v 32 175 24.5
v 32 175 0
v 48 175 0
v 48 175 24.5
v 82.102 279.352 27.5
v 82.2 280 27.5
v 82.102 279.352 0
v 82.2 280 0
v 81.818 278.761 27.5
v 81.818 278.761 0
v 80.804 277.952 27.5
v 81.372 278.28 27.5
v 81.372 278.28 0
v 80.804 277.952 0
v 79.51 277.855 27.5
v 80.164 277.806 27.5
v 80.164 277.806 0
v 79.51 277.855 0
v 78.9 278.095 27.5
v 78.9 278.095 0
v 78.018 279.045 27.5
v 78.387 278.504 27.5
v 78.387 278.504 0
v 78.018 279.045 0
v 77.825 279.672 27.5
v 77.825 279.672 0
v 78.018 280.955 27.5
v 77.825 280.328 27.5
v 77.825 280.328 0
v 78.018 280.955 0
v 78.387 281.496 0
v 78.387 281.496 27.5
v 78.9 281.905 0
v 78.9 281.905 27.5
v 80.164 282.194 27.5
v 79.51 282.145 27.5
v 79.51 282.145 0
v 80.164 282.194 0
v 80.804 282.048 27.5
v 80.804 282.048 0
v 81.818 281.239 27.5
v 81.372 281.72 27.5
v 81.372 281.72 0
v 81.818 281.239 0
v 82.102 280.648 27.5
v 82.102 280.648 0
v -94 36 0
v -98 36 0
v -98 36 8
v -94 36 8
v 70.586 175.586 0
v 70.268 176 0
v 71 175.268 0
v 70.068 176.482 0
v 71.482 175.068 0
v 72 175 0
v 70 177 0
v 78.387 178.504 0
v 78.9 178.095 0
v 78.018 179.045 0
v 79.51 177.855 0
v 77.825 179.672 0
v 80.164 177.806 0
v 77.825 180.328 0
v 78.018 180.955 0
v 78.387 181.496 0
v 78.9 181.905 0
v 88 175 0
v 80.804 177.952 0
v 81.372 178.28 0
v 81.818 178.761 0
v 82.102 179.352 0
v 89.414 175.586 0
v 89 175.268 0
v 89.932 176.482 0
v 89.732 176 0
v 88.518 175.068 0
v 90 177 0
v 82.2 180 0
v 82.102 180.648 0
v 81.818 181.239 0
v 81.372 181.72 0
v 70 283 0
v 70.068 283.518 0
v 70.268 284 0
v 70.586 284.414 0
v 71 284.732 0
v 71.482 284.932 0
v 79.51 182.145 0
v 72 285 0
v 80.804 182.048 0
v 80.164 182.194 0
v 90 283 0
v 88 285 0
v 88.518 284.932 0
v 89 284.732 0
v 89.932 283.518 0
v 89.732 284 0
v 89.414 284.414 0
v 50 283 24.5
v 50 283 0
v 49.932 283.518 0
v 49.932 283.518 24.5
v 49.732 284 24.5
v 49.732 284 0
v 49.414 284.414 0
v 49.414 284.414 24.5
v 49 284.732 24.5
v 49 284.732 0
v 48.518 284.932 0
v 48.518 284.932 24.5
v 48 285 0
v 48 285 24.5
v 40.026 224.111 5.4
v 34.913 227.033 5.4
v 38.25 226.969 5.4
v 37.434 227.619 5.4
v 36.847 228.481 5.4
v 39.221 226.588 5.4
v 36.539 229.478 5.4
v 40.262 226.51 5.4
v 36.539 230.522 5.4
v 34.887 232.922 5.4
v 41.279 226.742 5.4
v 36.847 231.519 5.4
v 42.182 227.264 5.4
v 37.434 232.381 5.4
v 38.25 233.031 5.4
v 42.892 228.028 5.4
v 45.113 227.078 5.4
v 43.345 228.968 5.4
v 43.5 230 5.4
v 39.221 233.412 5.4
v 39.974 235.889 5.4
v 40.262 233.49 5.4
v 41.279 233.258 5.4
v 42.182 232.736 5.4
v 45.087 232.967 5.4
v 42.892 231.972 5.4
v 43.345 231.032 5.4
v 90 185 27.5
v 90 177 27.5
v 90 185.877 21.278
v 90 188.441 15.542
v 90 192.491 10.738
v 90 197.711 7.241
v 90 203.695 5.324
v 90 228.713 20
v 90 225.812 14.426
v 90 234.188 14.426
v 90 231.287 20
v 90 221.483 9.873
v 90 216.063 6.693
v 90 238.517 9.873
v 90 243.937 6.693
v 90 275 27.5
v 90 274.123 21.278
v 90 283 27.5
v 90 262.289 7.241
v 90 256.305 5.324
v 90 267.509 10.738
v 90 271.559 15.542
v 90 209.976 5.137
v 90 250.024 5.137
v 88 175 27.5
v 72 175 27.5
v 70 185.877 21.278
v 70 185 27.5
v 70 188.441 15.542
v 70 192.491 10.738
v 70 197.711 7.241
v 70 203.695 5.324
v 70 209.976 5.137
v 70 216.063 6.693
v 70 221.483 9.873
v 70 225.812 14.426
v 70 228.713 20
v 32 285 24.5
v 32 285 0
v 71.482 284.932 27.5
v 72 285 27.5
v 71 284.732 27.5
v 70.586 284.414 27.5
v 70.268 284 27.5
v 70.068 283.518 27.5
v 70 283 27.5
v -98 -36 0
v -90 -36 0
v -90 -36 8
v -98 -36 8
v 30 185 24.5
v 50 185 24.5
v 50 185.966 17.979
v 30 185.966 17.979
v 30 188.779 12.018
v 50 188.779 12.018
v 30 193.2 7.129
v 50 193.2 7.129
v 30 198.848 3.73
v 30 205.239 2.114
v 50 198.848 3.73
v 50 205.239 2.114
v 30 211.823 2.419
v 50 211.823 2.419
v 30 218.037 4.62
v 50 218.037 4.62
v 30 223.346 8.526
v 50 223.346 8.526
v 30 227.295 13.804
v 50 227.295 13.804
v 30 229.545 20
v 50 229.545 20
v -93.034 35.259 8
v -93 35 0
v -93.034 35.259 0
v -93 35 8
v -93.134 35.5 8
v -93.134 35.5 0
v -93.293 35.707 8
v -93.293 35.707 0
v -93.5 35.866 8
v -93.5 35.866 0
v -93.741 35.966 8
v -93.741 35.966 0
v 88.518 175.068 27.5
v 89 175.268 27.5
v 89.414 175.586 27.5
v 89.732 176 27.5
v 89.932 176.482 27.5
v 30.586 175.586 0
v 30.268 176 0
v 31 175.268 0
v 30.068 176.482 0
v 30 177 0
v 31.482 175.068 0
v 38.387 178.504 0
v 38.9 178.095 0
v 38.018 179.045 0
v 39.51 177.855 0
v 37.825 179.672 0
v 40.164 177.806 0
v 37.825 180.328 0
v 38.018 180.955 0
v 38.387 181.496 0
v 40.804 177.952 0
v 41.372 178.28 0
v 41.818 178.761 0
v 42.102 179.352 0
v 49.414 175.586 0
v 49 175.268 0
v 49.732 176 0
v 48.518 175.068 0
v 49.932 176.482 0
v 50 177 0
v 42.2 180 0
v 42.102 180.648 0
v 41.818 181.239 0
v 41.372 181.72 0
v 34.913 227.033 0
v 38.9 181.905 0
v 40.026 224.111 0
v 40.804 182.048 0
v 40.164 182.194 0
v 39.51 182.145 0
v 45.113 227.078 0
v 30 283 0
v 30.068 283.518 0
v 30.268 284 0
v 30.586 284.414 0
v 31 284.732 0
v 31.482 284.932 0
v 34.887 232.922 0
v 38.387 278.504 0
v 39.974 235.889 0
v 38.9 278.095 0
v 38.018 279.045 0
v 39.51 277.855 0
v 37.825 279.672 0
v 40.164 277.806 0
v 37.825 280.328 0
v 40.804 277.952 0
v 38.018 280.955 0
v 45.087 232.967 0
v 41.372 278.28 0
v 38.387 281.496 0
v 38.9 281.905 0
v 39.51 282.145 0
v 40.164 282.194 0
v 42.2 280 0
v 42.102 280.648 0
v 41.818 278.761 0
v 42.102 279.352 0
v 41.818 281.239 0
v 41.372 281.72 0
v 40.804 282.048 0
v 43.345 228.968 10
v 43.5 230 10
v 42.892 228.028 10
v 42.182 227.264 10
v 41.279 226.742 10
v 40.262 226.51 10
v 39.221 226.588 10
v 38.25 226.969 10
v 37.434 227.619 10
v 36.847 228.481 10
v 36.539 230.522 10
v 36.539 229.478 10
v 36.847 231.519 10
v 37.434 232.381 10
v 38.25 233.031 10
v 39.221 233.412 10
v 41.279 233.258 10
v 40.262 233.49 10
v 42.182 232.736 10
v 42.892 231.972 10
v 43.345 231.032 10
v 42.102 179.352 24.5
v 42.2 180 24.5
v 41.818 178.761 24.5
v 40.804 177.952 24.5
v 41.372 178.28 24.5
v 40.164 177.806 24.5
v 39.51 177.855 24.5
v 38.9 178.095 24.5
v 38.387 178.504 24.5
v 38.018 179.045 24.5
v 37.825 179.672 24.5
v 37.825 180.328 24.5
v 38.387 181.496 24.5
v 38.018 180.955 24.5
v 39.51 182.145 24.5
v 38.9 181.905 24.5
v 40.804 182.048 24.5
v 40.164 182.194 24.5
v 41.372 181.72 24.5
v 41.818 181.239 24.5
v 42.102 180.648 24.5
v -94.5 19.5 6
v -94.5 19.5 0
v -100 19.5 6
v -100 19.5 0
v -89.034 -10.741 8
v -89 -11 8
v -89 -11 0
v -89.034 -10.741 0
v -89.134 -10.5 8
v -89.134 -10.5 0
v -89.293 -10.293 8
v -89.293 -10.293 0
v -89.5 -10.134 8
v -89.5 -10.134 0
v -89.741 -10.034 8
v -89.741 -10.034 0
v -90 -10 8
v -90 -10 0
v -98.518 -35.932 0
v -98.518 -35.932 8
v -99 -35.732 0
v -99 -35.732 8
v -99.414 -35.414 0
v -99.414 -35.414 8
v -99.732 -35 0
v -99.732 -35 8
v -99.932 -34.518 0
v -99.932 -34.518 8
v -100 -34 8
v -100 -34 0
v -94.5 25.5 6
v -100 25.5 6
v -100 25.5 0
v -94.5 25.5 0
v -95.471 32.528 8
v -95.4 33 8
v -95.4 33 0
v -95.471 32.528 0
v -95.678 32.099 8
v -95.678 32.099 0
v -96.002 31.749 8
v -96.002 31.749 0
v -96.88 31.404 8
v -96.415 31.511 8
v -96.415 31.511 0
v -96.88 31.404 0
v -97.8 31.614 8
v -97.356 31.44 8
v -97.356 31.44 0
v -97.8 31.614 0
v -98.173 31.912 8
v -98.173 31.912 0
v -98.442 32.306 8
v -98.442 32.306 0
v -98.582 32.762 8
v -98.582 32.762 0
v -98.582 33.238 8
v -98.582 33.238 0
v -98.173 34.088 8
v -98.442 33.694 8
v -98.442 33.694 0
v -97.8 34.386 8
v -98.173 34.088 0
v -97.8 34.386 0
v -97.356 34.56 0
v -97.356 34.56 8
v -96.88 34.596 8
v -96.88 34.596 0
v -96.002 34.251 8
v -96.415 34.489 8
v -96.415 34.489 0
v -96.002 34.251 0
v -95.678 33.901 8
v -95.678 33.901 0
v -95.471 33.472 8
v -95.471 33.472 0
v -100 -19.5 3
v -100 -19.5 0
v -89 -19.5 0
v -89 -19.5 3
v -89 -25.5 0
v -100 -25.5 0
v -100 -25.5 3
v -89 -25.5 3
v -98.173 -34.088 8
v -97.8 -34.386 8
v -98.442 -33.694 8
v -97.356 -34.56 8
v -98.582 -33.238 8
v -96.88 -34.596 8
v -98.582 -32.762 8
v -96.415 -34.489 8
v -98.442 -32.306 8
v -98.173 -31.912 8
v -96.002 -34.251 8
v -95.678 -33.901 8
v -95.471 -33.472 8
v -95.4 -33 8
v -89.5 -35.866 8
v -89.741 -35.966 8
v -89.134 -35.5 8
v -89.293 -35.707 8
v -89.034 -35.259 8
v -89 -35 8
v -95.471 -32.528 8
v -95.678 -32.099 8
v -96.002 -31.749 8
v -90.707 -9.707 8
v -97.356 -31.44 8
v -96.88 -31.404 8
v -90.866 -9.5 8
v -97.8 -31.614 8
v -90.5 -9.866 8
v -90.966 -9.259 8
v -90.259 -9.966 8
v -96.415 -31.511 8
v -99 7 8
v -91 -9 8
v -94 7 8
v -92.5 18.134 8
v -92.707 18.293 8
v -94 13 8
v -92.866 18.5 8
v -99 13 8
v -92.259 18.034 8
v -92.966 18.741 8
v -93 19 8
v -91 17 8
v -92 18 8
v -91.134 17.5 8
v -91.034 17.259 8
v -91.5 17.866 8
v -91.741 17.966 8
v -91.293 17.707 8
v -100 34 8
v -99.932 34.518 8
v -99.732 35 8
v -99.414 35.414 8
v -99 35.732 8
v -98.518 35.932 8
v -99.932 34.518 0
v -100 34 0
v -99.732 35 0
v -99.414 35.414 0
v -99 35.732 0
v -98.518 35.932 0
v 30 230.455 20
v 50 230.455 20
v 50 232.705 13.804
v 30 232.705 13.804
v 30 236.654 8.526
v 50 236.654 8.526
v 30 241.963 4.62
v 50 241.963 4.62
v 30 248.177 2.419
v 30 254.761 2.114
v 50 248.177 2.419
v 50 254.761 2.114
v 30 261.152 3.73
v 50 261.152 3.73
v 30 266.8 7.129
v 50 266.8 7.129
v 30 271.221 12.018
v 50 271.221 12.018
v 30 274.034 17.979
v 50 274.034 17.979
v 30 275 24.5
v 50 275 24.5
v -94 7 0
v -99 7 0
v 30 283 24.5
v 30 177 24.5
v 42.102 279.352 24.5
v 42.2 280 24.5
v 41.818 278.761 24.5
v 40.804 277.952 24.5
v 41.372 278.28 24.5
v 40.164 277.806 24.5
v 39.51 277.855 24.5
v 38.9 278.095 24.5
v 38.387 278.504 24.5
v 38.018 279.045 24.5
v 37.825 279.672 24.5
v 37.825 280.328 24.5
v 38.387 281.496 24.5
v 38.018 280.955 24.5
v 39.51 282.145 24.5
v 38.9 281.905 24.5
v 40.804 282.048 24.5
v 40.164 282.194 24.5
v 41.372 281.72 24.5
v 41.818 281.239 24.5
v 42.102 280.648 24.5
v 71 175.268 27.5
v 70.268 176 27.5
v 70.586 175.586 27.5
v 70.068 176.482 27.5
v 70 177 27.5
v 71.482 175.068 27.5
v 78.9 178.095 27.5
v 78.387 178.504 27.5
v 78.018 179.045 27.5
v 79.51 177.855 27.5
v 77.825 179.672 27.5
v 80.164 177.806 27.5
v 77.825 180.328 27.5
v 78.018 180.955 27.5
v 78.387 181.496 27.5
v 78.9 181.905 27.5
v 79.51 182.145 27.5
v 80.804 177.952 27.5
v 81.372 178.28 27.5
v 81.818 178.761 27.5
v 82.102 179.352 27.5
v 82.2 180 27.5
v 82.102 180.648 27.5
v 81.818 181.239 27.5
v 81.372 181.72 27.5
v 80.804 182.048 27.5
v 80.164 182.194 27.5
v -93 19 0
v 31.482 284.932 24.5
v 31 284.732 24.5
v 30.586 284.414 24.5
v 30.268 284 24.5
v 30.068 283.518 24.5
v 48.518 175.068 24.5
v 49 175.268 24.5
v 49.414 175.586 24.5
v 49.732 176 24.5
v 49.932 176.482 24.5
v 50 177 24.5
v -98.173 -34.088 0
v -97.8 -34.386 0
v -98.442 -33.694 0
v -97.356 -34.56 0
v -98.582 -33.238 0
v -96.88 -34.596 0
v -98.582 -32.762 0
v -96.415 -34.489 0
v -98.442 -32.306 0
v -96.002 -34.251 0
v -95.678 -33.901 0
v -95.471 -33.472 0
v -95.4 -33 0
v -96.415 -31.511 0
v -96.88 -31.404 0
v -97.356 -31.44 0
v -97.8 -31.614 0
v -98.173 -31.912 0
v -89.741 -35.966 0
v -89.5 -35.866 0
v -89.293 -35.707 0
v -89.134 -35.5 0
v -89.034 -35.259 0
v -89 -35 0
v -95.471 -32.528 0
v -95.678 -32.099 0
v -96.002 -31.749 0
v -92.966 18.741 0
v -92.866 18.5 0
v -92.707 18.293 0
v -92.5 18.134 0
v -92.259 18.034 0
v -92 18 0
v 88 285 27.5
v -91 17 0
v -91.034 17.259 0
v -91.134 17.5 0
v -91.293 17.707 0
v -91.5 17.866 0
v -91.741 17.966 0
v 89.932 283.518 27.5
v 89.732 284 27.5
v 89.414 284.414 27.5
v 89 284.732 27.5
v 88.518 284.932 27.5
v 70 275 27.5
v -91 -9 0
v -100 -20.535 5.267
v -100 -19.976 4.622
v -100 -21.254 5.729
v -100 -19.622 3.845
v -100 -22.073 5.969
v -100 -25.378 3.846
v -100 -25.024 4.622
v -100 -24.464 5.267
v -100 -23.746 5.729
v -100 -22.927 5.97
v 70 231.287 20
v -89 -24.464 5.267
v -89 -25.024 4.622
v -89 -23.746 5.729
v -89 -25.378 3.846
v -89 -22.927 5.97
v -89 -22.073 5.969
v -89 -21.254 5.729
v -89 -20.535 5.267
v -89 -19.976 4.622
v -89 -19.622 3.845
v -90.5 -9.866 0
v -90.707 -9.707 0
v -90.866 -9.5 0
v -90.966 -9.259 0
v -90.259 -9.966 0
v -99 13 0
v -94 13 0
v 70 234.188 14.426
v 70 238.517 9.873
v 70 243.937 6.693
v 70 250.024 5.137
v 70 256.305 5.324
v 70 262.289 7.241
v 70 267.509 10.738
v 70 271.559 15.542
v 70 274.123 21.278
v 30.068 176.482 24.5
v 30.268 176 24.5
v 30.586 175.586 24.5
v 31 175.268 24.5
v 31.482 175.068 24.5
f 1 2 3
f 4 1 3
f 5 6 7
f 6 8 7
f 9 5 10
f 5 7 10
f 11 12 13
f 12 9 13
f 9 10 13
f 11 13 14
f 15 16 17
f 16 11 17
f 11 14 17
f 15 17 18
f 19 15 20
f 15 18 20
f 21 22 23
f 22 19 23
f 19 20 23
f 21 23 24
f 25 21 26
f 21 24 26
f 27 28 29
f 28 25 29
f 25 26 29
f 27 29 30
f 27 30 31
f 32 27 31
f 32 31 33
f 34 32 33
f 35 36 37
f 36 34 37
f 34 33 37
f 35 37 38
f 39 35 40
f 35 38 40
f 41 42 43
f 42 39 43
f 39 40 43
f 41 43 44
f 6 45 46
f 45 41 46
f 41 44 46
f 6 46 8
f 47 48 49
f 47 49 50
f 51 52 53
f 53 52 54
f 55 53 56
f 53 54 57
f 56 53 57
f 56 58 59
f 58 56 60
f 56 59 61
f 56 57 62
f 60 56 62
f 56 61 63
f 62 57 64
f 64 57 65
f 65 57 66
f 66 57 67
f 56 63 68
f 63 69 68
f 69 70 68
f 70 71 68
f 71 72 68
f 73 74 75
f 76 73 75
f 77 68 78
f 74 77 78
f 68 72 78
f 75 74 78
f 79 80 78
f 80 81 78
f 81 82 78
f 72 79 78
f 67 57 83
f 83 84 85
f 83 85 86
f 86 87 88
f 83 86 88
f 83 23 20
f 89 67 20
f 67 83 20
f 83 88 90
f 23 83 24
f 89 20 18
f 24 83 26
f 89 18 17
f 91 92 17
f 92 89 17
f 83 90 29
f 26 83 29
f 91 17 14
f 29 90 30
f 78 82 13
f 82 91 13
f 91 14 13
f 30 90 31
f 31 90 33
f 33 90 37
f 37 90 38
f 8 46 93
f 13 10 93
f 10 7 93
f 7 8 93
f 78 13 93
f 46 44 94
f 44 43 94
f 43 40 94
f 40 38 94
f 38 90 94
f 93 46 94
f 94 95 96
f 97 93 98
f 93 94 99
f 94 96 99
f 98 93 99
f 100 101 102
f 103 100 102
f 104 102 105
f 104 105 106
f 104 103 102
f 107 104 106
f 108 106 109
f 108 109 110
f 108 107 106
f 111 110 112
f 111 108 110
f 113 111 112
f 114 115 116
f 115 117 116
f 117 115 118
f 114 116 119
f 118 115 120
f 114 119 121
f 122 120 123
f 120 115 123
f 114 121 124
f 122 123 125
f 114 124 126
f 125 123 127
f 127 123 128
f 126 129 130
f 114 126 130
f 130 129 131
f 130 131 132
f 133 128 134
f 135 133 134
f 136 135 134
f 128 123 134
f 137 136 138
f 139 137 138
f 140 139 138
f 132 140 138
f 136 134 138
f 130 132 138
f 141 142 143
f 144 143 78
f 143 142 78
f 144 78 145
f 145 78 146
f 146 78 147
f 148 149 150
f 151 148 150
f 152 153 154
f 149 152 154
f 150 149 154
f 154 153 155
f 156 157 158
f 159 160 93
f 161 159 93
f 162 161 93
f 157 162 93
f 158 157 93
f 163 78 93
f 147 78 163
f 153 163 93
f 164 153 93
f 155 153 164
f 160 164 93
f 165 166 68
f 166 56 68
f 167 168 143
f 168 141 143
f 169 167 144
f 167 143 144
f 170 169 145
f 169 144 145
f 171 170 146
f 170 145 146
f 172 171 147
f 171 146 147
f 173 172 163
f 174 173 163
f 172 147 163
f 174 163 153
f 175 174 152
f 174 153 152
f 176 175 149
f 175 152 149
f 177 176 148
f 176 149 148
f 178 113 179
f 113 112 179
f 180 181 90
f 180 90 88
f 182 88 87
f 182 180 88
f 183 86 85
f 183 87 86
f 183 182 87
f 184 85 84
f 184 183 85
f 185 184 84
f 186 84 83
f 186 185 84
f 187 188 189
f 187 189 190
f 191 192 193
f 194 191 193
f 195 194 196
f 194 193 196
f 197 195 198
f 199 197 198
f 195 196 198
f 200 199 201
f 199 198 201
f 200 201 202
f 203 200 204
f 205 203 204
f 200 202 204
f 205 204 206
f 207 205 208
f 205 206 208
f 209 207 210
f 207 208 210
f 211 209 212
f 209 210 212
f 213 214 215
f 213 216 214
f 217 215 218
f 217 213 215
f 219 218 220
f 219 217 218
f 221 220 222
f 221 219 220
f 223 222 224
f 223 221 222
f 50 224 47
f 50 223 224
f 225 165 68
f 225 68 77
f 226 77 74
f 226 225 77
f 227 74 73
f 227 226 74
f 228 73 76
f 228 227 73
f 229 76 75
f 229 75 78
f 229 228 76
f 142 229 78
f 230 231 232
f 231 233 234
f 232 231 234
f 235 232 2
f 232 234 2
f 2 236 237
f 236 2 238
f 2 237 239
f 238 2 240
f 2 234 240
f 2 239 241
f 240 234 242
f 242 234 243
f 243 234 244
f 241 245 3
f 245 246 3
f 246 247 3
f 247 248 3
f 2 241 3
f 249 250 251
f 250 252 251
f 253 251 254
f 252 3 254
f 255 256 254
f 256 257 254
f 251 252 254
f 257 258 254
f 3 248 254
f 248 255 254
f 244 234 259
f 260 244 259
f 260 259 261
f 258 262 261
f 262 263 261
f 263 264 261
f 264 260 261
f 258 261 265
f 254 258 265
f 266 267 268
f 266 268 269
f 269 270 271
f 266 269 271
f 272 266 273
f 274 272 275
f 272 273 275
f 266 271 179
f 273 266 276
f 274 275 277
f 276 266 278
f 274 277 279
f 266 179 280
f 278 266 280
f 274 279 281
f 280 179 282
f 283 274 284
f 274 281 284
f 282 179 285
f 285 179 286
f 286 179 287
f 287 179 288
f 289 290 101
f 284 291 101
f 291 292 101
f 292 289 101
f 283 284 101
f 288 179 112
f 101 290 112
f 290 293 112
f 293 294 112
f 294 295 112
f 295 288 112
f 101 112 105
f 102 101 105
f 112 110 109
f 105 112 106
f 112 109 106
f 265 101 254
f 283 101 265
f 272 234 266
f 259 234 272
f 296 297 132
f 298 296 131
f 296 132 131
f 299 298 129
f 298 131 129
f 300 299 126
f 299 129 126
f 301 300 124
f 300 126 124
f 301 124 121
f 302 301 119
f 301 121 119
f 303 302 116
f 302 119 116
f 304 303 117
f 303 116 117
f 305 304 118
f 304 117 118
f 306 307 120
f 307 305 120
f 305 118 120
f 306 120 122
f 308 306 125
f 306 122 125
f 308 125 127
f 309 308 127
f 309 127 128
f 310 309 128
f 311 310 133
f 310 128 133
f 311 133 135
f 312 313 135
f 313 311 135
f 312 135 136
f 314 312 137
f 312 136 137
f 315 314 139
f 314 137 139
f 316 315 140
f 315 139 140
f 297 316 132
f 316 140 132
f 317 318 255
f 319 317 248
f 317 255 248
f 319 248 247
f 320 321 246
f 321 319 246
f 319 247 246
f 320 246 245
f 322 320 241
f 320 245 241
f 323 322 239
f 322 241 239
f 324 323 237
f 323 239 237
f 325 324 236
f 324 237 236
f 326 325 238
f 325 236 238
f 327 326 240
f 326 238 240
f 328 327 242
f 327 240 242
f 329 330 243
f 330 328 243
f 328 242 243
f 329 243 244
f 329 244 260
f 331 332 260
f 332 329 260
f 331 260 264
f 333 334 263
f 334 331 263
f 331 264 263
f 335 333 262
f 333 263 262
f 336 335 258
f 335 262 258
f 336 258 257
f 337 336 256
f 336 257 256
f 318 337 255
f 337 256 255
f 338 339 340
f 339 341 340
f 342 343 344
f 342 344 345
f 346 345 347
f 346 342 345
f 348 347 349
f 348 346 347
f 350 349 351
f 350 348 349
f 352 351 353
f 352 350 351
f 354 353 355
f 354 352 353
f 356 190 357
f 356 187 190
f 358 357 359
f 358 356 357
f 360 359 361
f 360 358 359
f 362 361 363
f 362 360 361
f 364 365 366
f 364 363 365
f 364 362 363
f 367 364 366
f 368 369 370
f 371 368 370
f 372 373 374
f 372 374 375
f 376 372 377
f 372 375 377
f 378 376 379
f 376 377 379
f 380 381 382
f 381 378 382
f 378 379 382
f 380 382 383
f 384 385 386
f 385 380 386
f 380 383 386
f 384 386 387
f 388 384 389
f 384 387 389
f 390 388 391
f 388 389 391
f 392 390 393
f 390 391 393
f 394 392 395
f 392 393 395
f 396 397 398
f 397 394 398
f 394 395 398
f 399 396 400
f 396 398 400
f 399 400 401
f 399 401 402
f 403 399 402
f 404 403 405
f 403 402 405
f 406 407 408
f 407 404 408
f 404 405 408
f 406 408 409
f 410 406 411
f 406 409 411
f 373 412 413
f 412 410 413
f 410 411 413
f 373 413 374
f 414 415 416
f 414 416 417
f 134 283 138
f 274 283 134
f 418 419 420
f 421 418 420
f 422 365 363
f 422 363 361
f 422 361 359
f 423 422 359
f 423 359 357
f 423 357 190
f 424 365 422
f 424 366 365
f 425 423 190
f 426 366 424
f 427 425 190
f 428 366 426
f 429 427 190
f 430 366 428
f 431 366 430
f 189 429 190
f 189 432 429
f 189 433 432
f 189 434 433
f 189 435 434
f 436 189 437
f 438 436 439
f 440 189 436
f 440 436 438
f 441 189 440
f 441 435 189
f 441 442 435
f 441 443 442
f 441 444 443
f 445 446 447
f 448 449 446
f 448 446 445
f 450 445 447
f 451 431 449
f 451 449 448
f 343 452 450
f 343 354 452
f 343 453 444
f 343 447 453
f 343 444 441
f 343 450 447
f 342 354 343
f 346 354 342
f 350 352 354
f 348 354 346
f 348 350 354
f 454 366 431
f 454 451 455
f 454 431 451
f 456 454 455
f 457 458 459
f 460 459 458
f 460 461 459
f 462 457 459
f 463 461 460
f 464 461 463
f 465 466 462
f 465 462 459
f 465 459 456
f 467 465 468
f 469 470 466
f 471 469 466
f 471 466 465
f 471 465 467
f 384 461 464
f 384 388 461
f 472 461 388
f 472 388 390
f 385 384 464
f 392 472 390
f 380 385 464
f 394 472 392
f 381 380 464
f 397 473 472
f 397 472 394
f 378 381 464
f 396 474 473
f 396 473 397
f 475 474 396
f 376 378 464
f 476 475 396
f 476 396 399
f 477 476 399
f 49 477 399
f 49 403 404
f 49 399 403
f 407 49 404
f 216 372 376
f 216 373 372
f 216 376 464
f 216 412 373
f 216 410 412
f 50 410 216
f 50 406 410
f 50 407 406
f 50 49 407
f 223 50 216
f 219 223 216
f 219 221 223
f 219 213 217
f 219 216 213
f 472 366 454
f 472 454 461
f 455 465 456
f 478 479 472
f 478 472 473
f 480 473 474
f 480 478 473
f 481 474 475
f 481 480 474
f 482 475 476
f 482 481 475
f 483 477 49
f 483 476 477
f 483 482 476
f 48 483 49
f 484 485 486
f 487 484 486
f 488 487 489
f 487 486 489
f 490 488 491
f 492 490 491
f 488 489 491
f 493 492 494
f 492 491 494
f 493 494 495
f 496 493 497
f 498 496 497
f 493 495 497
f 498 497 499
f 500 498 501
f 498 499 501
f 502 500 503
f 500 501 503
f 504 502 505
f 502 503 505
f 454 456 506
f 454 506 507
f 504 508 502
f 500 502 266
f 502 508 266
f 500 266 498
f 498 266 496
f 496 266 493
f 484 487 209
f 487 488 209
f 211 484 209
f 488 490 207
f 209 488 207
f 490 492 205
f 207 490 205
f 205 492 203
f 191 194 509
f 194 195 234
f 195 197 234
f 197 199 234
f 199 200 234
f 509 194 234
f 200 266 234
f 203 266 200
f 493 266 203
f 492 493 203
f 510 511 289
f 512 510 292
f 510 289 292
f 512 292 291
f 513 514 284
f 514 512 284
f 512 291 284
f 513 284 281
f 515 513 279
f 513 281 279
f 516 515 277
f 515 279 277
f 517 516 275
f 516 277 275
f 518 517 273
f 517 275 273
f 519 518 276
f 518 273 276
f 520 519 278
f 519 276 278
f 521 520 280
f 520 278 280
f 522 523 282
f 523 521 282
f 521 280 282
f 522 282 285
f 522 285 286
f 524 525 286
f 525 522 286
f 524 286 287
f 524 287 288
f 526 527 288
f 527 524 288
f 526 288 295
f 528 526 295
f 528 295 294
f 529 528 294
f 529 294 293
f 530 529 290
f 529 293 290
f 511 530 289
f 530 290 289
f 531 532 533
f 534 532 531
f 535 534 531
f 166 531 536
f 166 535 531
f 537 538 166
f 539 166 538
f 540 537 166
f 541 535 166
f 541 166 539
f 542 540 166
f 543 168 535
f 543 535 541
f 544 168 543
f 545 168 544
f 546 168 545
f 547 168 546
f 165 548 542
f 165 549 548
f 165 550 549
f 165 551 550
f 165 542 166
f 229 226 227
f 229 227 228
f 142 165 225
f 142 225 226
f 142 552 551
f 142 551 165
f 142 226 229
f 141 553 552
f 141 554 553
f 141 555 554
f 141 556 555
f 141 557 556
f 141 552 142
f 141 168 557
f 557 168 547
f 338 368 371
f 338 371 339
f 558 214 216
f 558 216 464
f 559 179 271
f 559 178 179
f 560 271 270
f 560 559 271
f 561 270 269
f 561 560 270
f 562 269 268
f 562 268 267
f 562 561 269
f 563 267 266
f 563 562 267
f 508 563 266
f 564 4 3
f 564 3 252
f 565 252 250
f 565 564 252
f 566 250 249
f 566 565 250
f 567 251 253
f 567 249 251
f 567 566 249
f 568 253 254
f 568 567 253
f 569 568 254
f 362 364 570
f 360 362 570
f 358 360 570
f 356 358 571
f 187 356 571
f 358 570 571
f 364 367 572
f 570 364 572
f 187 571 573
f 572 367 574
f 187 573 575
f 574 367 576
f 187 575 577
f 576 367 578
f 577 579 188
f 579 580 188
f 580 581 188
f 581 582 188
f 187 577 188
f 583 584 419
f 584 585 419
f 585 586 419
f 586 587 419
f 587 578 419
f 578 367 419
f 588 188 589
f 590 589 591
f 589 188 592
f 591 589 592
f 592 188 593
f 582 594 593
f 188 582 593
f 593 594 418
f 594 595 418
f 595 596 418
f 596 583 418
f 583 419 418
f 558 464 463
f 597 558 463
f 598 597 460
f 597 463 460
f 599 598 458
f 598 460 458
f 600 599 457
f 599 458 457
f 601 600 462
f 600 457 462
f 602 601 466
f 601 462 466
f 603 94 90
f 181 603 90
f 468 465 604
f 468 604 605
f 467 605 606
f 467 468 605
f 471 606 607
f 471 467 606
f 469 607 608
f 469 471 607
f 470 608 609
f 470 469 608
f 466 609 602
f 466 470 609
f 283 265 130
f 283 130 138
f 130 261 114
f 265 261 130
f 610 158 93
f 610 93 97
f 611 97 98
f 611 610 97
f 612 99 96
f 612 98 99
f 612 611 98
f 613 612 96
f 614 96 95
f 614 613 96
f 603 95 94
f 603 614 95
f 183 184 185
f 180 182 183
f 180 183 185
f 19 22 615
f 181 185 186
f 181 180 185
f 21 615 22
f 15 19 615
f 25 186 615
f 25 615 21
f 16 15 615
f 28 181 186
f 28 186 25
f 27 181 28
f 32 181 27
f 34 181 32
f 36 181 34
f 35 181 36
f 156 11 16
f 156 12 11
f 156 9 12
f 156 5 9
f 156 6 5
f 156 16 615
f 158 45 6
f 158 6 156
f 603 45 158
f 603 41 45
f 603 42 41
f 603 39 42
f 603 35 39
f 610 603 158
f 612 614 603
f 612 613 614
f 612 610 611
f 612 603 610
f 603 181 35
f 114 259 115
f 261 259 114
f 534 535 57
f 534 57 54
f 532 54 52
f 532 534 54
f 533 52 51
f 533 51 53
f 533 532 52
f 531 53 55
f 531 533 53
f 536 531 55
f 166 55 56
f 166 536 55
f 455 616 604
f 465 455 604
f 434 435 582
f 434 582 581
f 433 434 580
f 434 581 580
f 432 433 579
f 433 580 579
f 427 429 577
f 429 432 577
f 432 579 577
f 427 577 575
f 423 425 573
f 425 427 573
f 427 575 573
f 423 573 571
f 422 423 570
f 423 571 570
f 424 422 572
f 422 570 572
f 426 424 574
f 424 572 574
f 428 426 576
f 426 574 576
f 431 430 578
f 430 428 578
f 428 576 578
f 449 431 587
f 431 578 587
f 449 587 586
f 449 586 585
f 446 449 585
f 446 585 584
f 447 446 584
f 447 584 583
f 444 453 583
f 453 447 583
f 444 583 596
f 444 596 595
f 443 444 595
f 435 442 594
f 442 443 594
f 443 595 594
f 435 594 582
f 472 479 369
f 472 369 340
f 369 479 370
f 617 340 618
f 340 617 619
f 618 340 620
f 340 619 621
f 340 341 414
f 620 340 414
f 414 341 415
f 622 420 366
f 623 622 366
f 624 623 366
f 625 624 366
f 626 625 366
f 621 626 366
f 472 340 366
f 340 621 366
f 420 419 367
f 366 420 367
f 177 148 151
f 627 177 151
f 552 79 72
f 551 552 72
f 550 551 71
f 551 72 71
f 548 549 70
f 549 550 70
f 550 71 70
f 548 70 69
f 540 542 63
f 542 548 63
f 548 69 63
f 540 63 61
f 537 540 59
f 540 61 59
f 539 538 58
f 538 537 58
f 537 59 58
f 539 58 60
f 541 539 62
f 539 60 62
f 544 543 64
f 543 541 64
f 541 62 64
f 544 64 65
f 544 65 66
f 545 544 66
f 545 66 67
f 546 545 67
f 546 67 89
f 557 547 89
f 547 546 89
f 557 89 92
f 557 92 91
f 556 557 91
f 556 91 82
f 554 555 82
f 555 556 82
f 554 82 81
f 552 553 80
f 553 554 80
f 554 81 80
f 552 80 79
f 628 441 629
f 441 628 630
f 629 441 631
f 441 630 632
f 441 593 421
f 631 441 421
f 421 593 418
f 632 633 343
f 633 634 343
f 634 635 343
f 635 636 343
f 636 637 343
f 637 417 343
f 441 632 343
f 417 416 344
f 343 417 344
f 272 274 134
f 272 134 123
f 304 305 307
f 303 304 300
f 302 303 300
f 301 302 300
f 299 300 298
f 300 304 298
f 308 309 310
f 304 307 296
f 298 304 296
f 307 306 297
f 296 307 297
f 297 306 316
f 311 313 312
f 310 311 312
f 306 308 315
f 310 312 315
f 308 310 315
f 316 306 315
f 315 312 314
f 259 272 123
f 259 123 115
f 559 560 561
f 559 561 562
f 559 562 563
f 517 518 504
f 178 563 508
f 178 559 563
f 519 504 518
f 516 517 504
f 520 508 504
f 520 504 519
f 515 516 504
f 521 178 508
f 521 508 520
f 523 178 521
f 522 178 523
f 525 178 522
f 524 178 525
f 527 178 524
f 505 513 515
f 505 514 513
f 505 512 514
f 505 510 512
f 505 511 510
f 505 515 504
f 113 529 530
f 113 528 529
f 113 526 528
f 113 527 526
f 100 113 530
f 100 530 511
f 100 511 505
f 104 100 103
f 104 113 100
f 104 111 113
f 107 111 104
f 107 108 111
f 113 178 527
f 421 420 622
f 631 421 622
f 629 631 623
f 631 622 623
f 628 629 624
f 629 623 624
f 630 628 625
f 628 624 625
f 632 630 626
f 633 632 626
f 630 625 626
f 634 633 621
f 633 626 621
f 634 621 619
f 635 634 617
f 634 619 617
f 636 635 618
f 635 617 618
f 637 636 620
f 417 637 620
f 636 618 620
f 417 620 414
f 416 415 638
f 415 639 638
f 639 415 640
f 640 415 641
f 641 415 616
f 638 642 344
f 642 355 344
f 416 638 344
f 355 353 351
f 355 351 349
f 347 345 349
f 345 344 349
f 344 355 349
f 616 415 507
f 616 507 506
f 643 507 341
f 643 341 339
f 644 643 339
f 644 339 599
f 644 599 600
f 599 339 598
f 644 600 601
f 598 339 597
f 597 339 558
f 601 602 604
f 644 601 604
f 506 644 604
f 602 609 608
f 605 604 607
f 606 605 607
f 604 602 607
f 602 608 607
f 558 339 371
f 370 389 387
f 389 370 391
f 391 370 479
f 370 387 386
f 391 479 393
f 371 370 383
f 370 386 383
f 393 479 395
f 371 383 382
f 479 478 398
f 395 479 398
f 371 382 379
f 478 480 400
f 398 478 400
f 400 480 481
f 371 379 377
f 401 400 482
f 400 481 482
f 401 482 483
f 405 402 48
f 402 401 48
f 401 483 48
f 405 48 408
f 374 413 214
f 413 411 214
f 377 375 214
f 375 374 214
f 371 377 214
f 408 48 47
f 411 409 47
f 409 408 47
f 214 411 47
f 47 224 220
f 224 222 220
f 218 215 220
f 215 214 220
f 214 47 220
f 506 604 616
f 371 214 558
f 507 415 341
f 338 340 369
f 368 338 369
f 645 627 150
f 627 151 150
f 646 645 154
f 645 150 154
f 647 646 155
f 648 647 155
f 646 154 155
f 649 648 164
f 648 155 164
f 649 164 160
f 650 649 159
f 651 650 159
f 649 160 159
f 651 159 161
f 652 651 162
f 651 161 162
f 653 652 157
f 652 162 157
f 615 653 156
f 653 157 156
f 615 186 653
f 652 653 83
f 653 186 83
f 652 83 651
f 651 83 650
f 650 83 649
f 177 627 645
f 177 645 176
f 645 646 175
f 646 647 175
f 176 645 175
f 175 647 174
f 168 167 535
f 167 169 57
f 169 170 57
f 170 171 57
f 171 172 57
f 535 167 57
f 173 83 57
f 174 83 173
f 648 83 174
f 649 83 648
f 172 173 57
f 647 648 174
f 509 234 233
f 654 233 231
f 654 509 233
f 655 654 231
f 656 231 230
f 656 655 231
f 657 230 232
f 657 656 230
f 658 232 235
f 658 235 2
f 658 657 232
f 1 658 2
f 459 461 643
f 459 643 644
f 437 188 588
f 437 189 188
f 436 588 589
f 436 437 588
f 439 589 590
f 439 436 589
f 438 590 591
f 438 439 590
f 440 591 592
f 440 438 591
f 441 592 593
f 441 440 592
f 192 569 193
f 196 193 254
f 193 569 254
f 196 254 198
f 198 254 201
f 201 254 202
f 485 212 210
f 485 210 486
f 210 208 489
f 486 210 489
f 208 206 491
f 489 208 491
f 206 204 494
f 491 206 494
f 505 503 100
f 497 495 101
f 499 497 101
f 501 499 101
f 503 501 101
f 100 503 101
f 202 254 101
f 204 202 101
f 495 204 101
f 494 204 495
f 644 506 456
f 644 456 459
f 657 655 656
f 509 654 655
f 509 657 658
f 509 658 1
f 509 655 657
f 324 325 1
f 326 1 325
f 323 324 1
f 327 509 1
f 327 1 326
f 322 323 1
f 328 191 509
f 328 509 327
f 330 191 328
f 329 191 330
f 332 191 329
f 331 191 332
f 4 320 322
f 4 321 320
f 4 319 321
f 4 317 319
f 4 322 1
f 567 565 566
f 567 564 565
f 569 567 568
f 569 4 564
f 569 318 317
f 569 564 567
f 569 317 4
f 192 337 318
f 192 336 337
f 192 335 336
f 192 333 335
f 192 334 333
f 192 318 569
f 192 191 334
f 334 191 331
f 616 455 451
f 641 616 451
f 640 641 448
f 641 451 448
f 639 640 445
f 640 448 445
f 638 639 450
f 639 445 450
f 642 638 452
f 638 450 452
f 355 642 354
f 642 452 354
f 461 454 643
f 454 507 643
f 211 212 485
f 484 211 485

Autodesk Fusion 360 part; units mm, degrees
sketch "スケッチ1" plane through (0, 0, 0) normal (0, 0, 1) x (1, 0, 0)
  line L0 (21.5, 36) -> (-21.5, 36)
  line L1 (-23.5, 34) -> (-23.5, -34)
  line L2 (-21.5, -36) -> (21.5, -36)
  circle A0 centre (-20.5, -33) radius 1.6
  circle A1 centre (20.5, -33) radius 1.6
  arc A2 (-23.5, -34) -> (-21.5, -36) centre (-21.5, -34) ccw
  arc A3 (-21.5, 36) -> (-23.5, 34) centre (-21.5, 34) ccw
  arc A4 (23.5, 34) -> (21.5, 36) centre (21.5, 34) ccw
  arc A5 (21.5, -36) -> (23.5, -34) centre (21.5, -34) ccw
  line L3 (21.5, -15) -> (16, -15)
  line L4 (23.5, -34) -> (23.5, -17)
  arc A6 (15.5314, -14.9843) -> (16, -15) centre (16, -8) ccw
  arc A7 (23.5, -17) -> (21.5, -15) centre (21.5, -17) ccw
  arc A8 (21.5, -1) -> (22.3523, -0.8093) centre (21.5, 1) ccw
  line L5 (6, -6) -> (6, 10)
  line L6 (15, 19) -> (21.5, 19)
  line L7 (23.5, 21) -> (23.5, 34)
  arc A9 (6, -6) -> (15.5314, -14.9843) centre (15, -6) ccw
  arc A10 (15, 19) -> (6, 10) centre (15, 10) ccw
  arc A11 (21.5, 19) -> (23.5, 21) centre (21.5, 21) ccw
  line L8 (30, 34) -> (30, -34)
  line L9 (32, -36) -> (75, -36)
  arc A12 (32, 36) -> (30, 34) centre (32, 34) ccw
  arc A13 (30, -34) -> (32, -36) centre (32, -34) ccw
  circle A14 centre (33, -33) radius 1.6
  line L10 (77, 21) -> (77, 34)
  arc A15 (77, 34) -> (75, 36) centre (75, 34) ccw
  line L11 (77, -34) -> (77, 21)
  circle A16 centre (74, -33) radius 1.6
  line L12 (75, 36) -> (32, 36)
  arc A17 (75, -36) -> (77, -34) centre (75, -34) ccw
  line L13 (81.5, 34) -> (81.5, -34)
  arc A18 (126.5, -36) -> (128.5, -34) centre (126.5, -34) ccw
  line L14 (83.5, -36) -> (126.5, -36)
  arc A19 (81.5, -34) -> (83.5, -36) centre (83.5, -34) ccw
  line L15 (126.5, 36) -> (83.5, 36)
  arc A20 (128.5, 34) -> (126.5, 36) centre (126.5, 34) ccw
  circle A21 centre (125.5, -33) radius 1.6
  arc A22 (83.5, 36) -> (81.5, 34) centre (83.5, 34) ccw
  circle A23 centre (84.5, -33) radius 1.6
  line L16 (128.5, 21) -> (128.5, 34)
  line L17 (128.5, -34) -> (128.5, 21)
  circle A24 centre (90, 0) radius 1.6
  circle A25 centre (120, 0) radius 1.6
  arc A26 (-73.5, -34) -> (-71.5, -36) centre (-71.5, -34) ccw
  circle A27 centre (-70.5, -33) radius 1.6
  line L18 (-73.5, 34) -> (-73.5, -34)
  arc A28 (-71.5, 36) -> (-73.5, 34) centre (-71.5, 34) ccw
  line L19 (-35, 19) -> (-28.5, 19)
  arc A29 (-28.5, 19) -> (-26.5, 21) centre (-28.5, 21) ccw
  line L20 (-44, -10) -> (-44, 10)
  circle A30 centre (-29.5, -33) radius 1.6
  arc A31 (-28.5, -36) -> (-26.5, -34) centre (-28.5, -34) ccw
  line L21 (-26.5, -34) -> (-26.5, -21)
  arc A32 (-26.5, 34) -> (-28.5, 36) centre (-28.5, 34) ccw
  arc A33 (-28.5, -1) -> (-27.6477, -0.8093) centre (-28.5, 1) ccw
  circle A34 centre (-29.5, 33) radius 1.6
  line L22 (-26.5, 21) -> (-26.5, 34)
  arc A35 (-35, 19) -> (-44, 10) centre (-35, 10) ccw
  line L23 (-71.5, -36) -> (-28.5, -36)
  line L24 (-28.5, 36) -> (-71.5, 36)
  line L25 (-62.5, 28.5) -> (-53, 28.5)
  line L26 (-48.5, 24.0011) -> (-48.5, 23.9989)
  line L27 (-53, 19.5) -> (-62.5, 19.5)
  arc A36 (-62.5, 28.5) -> (-62.5, 19.5) centre (-62.5, 24) ccw
  arc A37 (-53.0011, 19.5) -> (-53, 28.5) centre (-53, 24) ccw
  circle A38 centre (-20.5, 33) radius 1.6
  circle A39 centre (20.5, 33) radius 1.6
  circle A40 centre (-70.5, 33) radius 1.6
  circle A41 centre (33, 33) radius 1.6
  circle A42 centre (74, 33) radius 1.6
  circle A43 centre (84.5, 33) radius 1.6
  circle A44 centre (125.5, 33) radius 1.6
  circle A45 centre (-97, 33) radius 1.6
  arc A46 (-100, -34) -> (-98, -36) centre (-98, -34) ccw
  circle A47 centre (-97, -33) radius 1.6
  arc A48 (-98, 36) -> (-100, 34) centre (-98, 34) ccw
  line L28 (-93, 36) -> (-93, 18)
  line L29 (-93, -36) -> (-98, -36)
  line L30 (-98, 36) -> (-93, 36)
  line L31 (-95, 25.5) -> (-100, 25.5)
  line L32 (-100, 19.5) -> (-95, 19.5)
  line L33 (-95, 19.5) -> (-95, 25.5)
  line L34 (-100, 34) -> (-100, 25.5)
  line L35 (-99, 13) -> (-94, 13)
  line L36 (-94, 7) -> (-99, 7)
  line L37 (-99, 7) -> (-99, 13)
  line L38 (-94, 7) -> (-94, 13)
  line L39 (-93, -36) -> (-91, -36)
  line L40 (-91, -10) -> (-91, 18)
  line L41 (-93, 18) -> (-91, 18)
  line L42 (-89, -10) -> (-91, -10)
  line L43 (-91, -36) -> (-89, -36)
  line L44 (-89, -36) -> (-89, -10)
  line L45 (-91, -19.5) -> (-100, -19.5)
  line L46 (-100, -25.5) -> (-91, -25.5)
  line L47 (-91, -25.5) -> (-91, -19.5)
  line L48 (-100, 19.5) -> (-100, -19.5)
  line L49 (-100, -25.5) -> (-100, -34)
  line L50 (-100, -25.5) -> (-100, -19.5)
  line L51 (-100, 19.5) -> (-100, 25.5)
  arc A49 (-44, -10) -> (-35, -19) centre (-35, -10) ccw
  line L52 (-35, -19) -> (-28.5, -19)
  arc A50 (-26.5, -21) -> (-28.5, -19) centre (-28.5, -21) ccw
  circle A51 centre (90, 100) radius 1.6
  circle A52 centre (125.5, 133) radius 1.6
  circle A53 centre (84.5, 133) radius 1.6
  circle A54 centre (84.5, 67) radius 1.6
  circle A55 centre (120, 100) radius 1.6
  circle A56 centre (125.5, 67) radius 1.6
  line L53 (3, 45) -> (137, 45)
  line L54 (140, 48) -> (140, 152)
  line L55 (137, 155) -> (3, 155)
  line L56 (0, 152) -> (0, 48)
  circle A57 centre (60, 50) radius 2.1
  circle A58 centre (60, 150) radius 2.1
  arc A59 (0, 48) -> (3, 45) centre (3, 48) ccw
  arc A60 (3, 155) -> (0, 152) centre (3, 152) ccw
  arc A61 (140, 152) -> (137, 155) centre (137, 152) ccw
  arc A62 (137, 45) -> (140, 48) centre (137, 48) ccw
  circle A63 centre (40, 180) radius 2.2
  line L57 (30, 285) -> (30, 175)
  line L58 (30, 175) -> (50, 175)
  line L59 (50, 285) -> (30, 285)
  circle A64 centre (40, 280) radius 2.2
  line L60 (50, 175) -> (50, 285)
  line L61 (39.9738, 235.8889) -> (34.8869, 232.9218)
  line L62 (34.8869, 232.9218) -> (34.9132, 227.0328)
  line L63 (34.9132, 227.0328) -> (40.0262, 224.1111)
  line L64 (40.0262, 224.1111) -> (45.1131, 227.0783)
  line L65 (45.1131, 227.0783) -> (45.0868, 232.9672)
  line L66 (45.0868, 232.9672) -> (39.9738, 235.8889)
  circle A65 centre (40, 230) radius 3.5
  line L67 (70, 175) -> (90, 175)
  line L68 (90, 175) -> (90, 285)
  line L69 (70, 285) -> (70, 175)
  line L70 (90, 285) -> (70, 285)
  circle A66 centre (80, 280) radius 2.2
  circle A67 centre (80, 180) radius 2.2
  circle A68 centre (60, 100) radius 3.5
  point P0 (-25, -37.5)
  point P1 (-25, 37.5)
  point P2 (25, 37.5)
  point P3 (-23.5, 36)
  point P4 (-23.5, -36)
  point P5 (23.5, -36)
  point P6 (80, 37.5)
  point P7 (53.5, 0)
  point P8 (53.5, 0)
  point P9 (53.5, 0)
  point P10 (28.5, -37.5)
  point P11 (30, 37.485)
  point P12 (30, 36)
  point P13 (30, -36)
  point P14 (53.5, 0)
  point P15 (77, -36)
  point P16 (81.5, -36)
  point P17 (128.5, -36)
  point P18 (105, 0)
  point P19 (80, -37.5)
  point P20 (81.5, 36)
  point P21 (105, 0)
  point P22 (105, 0)
  point P23 (105, 0)
  point P24 (80, 37.5)
  point P25 (130, 37.5)
  point P26 (105, 0)
  point P27 (-73.5, -36)
  point P28 (-26.5, -36)
  point P29 (-73.5, 36)
  point P30 (-75, -37.5)
  point P31 (-25, 37.5)
  point P32 (-75, 37.5)
  point P33 (-21.5, 34)
  point P34 (21.5, 34)
  point P35 (-71.5, 34)
  point P36 (-28.5, 34)
  point P37 (32, 34)
  point P38 (75, 34)
  point P39 (32, 34)
  point P40 (75, 34)
  point P41 (83.5, 34)
  point P42 (126.5, 34)
  point P43 (83.5, 34)
  point P44 (126.5, 34)
  point P45 (-100, -36)
  point P46 (-101.5, -37.5)
  point P47 (-100, 36)
  point P48 (-101.5, 37.5)
  point P49 (-98, 34)
  point P50 (126.5, 134)
  point P51 (83.5, 134)
  point P52 (105, 100)
  point P53 (128.5, 64)
  point P54 (126.5, 134)
  point P55 (81.5, 64)
  point P56 (83.5, 134)
  point P57 (80, 137.5)
  point P58 (105, 100)
  point P59 (80, 62.5)
  point P60 (81.5, 136)
  point P61 (105, 100)
  point P62 (80, 137.5)
  point P63 (130, 137.5)
  point P64 (105, 100)
  point P65 (105, 100)
  point P66 (65, 100)
  point P67 (50, 45)
  point P68 (30, 175)
  point P69 (40, 230)
  point P70 (70, 175)
  dimension "d3" = 50
  dimension "d4" = 75
  dimension "d36" = 47
  dimension "d37" = 72
  dimension "d38" = 3.2
  dimension "d40" = 2
  dimension "d43" = 14
  dimension "d44" = 2
  dimension "d48" = 18
  dimension "d49" = 2
  dimension "d50" = 50
  dimension "d51" = 75
  dimension "d52" = 47
  dimension "d53" = 72
  dimension "d54" = 3.2
  dimension "d56" = 2
  dimension "d61" = 50
  dimension "d62" = 75
  dimension "d63" = 47
  dimension "d64" = 72
  dimension "d65" = 3.2
  dimension "d67" = 2
  dimension "d69" = 3.2
  dimension "d70" = 3.2
  dimension "d71" = 50
  dimension "d72" = 75
  dimension "d73" = 47
  dimension "d74" = 72
  dimension "d75" = 3.2
  dimension "d77" = 2
  dimension "d81" = 2
  dimension "d82" = 9
  dimension "d83" = 9
  dimension "d86" = 3.2
  dimension "d87" = 3.2
  dimension "d88" = 3.2
  dimension "d89" = 3.2
  dimension "d90" = 75
  dimension "d91" = 72
  dimension "d92" = 3.2
  dimension "d94" = 2
  dimension "d95" = 3.2
  dimension "d96" = 6
  dimension "d113" = 50
  dimension "d114" = 75
  dimension "d115" = 47
  dimension "d116" = 72
  dimension "d117" = 3.2
  dimension "d119" = 3.2
  dimension "d120" = 3.2
  dimension "d121" = 3.2
  dimension "d128" = 4.2
  dimension "d129" = 4.2
  dimension "d130" = 3
  dimension "d131" = 20
  dimension "d132" = 110
  dimension "d133" = 4.4
  dimension "d134" = 4.4
  dimension "d136" = 5.1
  dimension "d146" = 7
  dimension "d151" = 20
  dimension "d152" = 110
  dimension "d153" = 4.4
  dimension "d154" = 4.4
  dimension "d165" = 7
extrude "押し出し1" add sketch "スケッチ1" along normal blind 8 contours A46 A48 L28 L29 L30 L31 L32 L33 L34 L39 L40 L41 L42 L43 L44 L45 L46 L47 L48 L49 | L45 L46 L47 L50 | L31 L32 L33 L51 | L35 L36 L37 L38 makes body 1
sketch "スケッチ2" plane through (-100, 0, 0) normal (-1, 0, 0) x (0, -1, 0)
  line L0 (-34, 0) -> (34, 0)
  line L1 (34, 0) -> (34, 8)
  line L2 (34, 8) -> (-34, 8)
  line L3 (-34, 8) -> (-34, 0)
  line L4 (-19.5, 6) -> (-25.5, 6)
  line L5 (-25.5, 6) -> (-25.5, 0)
  line L6 (-25.5, 0) -> (-19.5, 0)
  line L7 (-19.5, 0) -> (-19.5, 6)
  line L8 (19.5, 0) -> (19.5, 3)
  line L9 (25.5, 0) -> (25.5, 3.0005)
  arc A0 (25.5, 2.9995) -> (19.5, 3) centre (22.5, 3) ccw
  line L10 (19.5, 0) -> (25.5, 0)
  point P0 (19.5, 0)
  point P1 (25.5, 0)
  dimension "d99" = 6
  dimension "d100" = 6
extrude "押し出し2" cut sketch "スケッチ2" against normal blind 5.5 contours L0 L4 L5 L6 L7 bodies 1
extrude "押し出し3" cut sketch "スケッチ2" against normal blind 11 contours L0 L8 L9 A0 L10 bodies 1
extrude "押し出し4" cut sketch "スケッチ1" along normal blind 8 contours L35 L36 L37 L38 bodies 1
fillet "フィレット1" radius 1 1 edges at (-93, 36, 4) on bodies 1
fillet "フィレット2" radius 1 3 edges at (-89, -36, 4) (-89, -10, 4) (-91, -10, 4) on bodies 1
fillet "フィレット3" radius 1 2 edges at (-91, 18, 4) (-93, 18, 4) on bodies 1
extrude "押し出し5" add sketch "スケッチ1" along normal blind 24.5 separate body contours L57 L58 L59 L60 makes body 2
sketch "スケッチ3" plane through (50, 0, 0) normal (1, 0, 0) x (0, 1, 0)
  line L0 (175, 0) -> (285, 0)
  line L1 (285, 0) -> (285, 24.5)
  line L2 (285, 24.5) -> (175, 24.5)
  line L3 (175, 24.5) -> (175, 0)
  arc A0 (185, 24.5) -> (229.5454, 20) centre (207.5, 24.5) ccw
  arc A1 (230.4546, 20) -> (275, 24.5) centre (252.5, 24.5) ccw
  line L4 (229.5454, 20) -> (230.4546, 20)
  point P0 (230, 15)
  dimension "d140" = 45
  dimension "d141" = 45
extrude "押し出し6" add sketch "スケッチ1" along normal blind 24.5 contours L61 L62 L63 L64 L65 L66 | A65 bodies 2
extrude "押し出し7" cut sketch "スケッチ1" along normal blind 5.4 contours L61 L62 L63 L64 L65 L66 | A65 bodies 2
extrude "押し出し8" cut sketch "スケッチ1" along normal blind 10 contours A65 bodies 2
extrude "押し出し9" cut sketch "スケッチ3" against normal blind 20 contours L2 A0 A1 L4 bodies 2
extrude "押し出し10" add sketch "スケッチ1" along normal blind 27.5 separate body contours L67 L68 L69 L70 makes body 3
sketch "スケッチ4" plane through (90, 0, 0) normal (1, 0, 0) x (0, 1, 0)
  line L0 (175, 0) -> (285, 0)
  line L1 (285, 0) -> (285, 27.5)
  line L2 (285, 27.5) -> (175, 27.5)
  line L3 (175, 27.5) -> (175, 0)
  line L4 (228.7132, 20) -> (231.2868, 20)
  arc A0 (185, 27.5) -> (228.7132, 20) centre (207.5, 27.5) ccw
  arc A1 (231.2868, 20) -> (275, 27.5) centre (252.5, 27.5) ccw
  point P0 (230, 14.9867)
  dimension "d161" = 45
  dimension "d162" = 45
extrude "押し出し11" cut sketch "スケッチ4" against normal blind 20 contours L2 L4 A0 A1 bodies 3
fillet "フィレット4" radius 2 4 edges at (30, 175, 12.25) (50, 175, 12.25) (70, 175, 13.75) (90, 175, 13.75) on bodies 2 3
fillet "フィレット5" radius 2 4 edges at (50, 285, 12.25) (30, 285, 12.25) (90, 285, 13.75) (70, 285, 13.75) on bodies 2 3
